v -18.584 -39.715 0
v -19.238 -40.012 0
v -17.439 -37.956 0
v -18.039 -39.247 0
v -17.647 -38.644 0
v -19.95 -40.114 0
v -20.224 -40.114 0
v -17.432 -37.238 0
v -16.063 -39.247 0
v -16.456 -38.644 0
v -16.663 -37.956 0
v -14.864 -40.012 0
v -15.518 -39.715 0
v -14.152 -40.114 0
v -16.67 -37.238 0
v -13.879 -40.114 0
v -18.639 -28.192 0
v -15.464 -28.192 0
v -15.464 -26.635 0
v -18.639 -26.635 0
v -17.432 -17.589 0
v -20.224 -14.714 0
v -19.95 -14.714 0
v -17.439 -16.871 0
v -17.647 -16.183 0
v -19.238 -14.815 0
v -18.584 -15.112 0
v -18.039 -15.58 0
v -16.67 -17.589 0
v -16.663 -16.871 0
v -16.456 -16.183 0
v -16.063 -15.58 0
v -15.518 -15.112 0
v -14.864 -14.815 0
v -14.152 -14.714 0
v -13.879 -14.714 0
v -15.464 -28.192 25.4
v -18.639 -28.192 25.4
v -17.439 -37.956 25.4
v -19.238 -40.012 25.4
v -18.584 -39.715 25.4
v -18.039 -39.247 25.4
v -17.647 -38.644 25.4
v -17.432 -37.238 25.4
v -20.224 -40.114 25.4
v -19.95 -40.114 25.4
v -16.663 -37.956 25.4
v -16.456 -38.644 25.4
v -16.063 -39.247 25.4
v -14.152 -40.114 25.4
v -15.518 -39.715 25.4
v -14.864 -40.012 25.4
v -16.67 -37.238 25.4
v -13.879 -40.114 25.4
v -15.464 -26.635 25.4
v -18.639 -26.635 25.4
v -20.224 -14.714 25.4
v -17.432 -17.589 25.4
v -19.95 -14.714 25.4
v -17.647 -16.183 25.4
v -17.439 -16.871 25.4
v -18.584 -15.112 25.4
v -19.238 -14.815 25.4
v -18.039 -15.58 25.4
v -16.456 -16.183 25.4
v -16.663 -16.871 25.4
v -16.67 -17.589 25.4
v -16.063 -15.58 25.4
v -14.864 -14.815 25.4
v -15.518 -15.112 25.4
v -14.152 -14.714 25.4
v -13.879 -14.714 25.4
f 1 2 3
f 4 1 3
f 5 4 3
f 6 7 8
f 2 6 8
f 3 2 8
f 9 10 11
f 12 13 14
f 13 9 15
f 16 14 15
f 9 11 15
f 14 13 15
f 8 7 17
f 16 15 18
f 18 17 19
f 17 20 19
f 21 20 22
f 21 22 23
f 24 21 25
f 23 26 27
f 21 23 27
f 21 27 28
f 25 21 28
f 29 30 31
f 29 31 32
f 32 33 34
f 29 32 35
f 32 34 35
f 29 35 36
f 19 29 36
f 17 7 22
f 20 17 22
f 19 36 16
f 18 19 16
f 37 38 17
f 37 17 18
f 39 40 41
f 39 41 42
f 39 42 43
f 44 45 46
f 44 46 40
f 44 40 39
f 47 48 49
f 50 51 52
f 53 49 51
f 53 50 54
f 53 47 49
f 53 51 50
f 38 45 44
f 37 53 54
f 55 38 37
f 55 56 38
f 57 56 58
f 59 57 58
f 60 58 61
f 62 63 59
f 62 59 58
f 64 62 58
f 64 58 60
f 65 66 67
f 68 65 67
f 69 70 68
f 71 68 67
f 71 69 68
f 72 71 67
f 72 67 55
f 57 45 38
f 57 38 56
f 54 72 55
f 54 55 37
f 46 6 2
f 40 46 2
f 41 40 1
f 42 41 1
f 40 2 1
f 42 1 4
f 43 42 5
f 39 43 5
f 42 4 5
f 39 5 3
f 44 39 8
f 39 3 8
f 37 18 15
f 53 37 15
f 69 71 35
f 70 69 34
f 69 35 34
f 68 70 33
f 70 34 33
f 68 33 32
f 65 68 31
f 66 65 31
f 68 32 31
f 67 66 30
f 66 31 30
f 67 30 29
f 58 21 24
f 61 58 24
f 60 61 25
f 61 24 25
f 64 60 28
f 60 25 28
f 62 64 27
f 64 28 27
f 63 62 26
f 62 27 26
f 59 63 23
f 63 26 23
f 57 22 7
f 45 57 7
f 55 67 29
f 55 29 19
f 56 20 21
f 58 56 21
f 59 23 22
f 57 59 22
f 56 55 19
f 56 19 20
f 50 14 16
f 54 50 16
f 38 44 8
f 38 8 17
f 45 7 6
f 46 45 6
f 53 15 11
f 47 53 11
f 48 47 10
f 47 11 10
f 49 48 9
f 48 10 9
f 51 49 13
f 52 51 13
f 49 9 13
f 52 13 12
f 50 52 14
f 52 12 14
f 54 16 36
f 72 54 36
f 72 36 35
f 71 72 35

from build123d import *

# Parameters (mm, degrees)
F1_DEPTH = 25.4


with BuildPart() as f1:
    # F0 (on Top) → F1 (new body)
    with BuildSketch(Plane.XY):
        with BuildLine():
            Line((-19.949808, -14.713609), (-20.223535, -14.713609))
            Line((-20.223535, -14.713609), (-20.223535, -28.192073))
            Line((-20.223535, -28.192073), (-18.638604, -28.192073))
            Line((-18.638604, -28.192073), (-15.463604, -28.192073))
            Line((-15.463604, -28.192073), (-13.878673, -28.192073))
            Line((-13.878673, -28.192073), (-13.878673, -14.713609))
            Line((-13.878673, -14.713609), (-14.1524, -14.713609))
            ThreePointArc((-14.1524, -14.713609), (-16.063492, -15.580491), (-16.670104, -17.589415))
            Line((-16.670104, -17.589415), (-15.463604, -26.635145))
            Line((-15.463604, -26.635145), (-18.638604, -26.635145))
            Line((-18.638604, -26.635145), (-17.432104, -17.589415))
            ThreePointArc((-17.432104, -17.589415), (-18.038716, -15.580491), (-19.949808, -14.713609))
        make_face()
        with BuildLine():
            Line((-18.638604, -28.192073), (-20.223535, -28.192073))
            Line((-20.223535, -28.192073), (-20.223535, -40.113609))
            Line((-20.223535, -40.113609), (-19.949808, -40.113609))
            ThreePointArc((-19.949808, -40.113609), (-18.038716, -39.246728), (-17.432104, -37.237803))
            Line((-17.432104, -37.237803), (-18.638604, -28.192073))
        make_face()
        with BuildLine():
            Line((-13.878673, -28.192073), (-15.463604, -28.192073))
            Line((-15.463604, -28.192073), (-16.670104, -37.237803))
            ThreePointArc((-16.670104, -37.237803), (-16.063492, -39.246728), (-14.1524, -40.113609))
            Line((-14.1524, -40.113609), (-13.878673, -40.113609))
            Line((-13.878673, -40.113609), (-13.878673, -28.192073))
        make_face()
    extrude(amount=F1_DEPTH)


solid = f1.part
